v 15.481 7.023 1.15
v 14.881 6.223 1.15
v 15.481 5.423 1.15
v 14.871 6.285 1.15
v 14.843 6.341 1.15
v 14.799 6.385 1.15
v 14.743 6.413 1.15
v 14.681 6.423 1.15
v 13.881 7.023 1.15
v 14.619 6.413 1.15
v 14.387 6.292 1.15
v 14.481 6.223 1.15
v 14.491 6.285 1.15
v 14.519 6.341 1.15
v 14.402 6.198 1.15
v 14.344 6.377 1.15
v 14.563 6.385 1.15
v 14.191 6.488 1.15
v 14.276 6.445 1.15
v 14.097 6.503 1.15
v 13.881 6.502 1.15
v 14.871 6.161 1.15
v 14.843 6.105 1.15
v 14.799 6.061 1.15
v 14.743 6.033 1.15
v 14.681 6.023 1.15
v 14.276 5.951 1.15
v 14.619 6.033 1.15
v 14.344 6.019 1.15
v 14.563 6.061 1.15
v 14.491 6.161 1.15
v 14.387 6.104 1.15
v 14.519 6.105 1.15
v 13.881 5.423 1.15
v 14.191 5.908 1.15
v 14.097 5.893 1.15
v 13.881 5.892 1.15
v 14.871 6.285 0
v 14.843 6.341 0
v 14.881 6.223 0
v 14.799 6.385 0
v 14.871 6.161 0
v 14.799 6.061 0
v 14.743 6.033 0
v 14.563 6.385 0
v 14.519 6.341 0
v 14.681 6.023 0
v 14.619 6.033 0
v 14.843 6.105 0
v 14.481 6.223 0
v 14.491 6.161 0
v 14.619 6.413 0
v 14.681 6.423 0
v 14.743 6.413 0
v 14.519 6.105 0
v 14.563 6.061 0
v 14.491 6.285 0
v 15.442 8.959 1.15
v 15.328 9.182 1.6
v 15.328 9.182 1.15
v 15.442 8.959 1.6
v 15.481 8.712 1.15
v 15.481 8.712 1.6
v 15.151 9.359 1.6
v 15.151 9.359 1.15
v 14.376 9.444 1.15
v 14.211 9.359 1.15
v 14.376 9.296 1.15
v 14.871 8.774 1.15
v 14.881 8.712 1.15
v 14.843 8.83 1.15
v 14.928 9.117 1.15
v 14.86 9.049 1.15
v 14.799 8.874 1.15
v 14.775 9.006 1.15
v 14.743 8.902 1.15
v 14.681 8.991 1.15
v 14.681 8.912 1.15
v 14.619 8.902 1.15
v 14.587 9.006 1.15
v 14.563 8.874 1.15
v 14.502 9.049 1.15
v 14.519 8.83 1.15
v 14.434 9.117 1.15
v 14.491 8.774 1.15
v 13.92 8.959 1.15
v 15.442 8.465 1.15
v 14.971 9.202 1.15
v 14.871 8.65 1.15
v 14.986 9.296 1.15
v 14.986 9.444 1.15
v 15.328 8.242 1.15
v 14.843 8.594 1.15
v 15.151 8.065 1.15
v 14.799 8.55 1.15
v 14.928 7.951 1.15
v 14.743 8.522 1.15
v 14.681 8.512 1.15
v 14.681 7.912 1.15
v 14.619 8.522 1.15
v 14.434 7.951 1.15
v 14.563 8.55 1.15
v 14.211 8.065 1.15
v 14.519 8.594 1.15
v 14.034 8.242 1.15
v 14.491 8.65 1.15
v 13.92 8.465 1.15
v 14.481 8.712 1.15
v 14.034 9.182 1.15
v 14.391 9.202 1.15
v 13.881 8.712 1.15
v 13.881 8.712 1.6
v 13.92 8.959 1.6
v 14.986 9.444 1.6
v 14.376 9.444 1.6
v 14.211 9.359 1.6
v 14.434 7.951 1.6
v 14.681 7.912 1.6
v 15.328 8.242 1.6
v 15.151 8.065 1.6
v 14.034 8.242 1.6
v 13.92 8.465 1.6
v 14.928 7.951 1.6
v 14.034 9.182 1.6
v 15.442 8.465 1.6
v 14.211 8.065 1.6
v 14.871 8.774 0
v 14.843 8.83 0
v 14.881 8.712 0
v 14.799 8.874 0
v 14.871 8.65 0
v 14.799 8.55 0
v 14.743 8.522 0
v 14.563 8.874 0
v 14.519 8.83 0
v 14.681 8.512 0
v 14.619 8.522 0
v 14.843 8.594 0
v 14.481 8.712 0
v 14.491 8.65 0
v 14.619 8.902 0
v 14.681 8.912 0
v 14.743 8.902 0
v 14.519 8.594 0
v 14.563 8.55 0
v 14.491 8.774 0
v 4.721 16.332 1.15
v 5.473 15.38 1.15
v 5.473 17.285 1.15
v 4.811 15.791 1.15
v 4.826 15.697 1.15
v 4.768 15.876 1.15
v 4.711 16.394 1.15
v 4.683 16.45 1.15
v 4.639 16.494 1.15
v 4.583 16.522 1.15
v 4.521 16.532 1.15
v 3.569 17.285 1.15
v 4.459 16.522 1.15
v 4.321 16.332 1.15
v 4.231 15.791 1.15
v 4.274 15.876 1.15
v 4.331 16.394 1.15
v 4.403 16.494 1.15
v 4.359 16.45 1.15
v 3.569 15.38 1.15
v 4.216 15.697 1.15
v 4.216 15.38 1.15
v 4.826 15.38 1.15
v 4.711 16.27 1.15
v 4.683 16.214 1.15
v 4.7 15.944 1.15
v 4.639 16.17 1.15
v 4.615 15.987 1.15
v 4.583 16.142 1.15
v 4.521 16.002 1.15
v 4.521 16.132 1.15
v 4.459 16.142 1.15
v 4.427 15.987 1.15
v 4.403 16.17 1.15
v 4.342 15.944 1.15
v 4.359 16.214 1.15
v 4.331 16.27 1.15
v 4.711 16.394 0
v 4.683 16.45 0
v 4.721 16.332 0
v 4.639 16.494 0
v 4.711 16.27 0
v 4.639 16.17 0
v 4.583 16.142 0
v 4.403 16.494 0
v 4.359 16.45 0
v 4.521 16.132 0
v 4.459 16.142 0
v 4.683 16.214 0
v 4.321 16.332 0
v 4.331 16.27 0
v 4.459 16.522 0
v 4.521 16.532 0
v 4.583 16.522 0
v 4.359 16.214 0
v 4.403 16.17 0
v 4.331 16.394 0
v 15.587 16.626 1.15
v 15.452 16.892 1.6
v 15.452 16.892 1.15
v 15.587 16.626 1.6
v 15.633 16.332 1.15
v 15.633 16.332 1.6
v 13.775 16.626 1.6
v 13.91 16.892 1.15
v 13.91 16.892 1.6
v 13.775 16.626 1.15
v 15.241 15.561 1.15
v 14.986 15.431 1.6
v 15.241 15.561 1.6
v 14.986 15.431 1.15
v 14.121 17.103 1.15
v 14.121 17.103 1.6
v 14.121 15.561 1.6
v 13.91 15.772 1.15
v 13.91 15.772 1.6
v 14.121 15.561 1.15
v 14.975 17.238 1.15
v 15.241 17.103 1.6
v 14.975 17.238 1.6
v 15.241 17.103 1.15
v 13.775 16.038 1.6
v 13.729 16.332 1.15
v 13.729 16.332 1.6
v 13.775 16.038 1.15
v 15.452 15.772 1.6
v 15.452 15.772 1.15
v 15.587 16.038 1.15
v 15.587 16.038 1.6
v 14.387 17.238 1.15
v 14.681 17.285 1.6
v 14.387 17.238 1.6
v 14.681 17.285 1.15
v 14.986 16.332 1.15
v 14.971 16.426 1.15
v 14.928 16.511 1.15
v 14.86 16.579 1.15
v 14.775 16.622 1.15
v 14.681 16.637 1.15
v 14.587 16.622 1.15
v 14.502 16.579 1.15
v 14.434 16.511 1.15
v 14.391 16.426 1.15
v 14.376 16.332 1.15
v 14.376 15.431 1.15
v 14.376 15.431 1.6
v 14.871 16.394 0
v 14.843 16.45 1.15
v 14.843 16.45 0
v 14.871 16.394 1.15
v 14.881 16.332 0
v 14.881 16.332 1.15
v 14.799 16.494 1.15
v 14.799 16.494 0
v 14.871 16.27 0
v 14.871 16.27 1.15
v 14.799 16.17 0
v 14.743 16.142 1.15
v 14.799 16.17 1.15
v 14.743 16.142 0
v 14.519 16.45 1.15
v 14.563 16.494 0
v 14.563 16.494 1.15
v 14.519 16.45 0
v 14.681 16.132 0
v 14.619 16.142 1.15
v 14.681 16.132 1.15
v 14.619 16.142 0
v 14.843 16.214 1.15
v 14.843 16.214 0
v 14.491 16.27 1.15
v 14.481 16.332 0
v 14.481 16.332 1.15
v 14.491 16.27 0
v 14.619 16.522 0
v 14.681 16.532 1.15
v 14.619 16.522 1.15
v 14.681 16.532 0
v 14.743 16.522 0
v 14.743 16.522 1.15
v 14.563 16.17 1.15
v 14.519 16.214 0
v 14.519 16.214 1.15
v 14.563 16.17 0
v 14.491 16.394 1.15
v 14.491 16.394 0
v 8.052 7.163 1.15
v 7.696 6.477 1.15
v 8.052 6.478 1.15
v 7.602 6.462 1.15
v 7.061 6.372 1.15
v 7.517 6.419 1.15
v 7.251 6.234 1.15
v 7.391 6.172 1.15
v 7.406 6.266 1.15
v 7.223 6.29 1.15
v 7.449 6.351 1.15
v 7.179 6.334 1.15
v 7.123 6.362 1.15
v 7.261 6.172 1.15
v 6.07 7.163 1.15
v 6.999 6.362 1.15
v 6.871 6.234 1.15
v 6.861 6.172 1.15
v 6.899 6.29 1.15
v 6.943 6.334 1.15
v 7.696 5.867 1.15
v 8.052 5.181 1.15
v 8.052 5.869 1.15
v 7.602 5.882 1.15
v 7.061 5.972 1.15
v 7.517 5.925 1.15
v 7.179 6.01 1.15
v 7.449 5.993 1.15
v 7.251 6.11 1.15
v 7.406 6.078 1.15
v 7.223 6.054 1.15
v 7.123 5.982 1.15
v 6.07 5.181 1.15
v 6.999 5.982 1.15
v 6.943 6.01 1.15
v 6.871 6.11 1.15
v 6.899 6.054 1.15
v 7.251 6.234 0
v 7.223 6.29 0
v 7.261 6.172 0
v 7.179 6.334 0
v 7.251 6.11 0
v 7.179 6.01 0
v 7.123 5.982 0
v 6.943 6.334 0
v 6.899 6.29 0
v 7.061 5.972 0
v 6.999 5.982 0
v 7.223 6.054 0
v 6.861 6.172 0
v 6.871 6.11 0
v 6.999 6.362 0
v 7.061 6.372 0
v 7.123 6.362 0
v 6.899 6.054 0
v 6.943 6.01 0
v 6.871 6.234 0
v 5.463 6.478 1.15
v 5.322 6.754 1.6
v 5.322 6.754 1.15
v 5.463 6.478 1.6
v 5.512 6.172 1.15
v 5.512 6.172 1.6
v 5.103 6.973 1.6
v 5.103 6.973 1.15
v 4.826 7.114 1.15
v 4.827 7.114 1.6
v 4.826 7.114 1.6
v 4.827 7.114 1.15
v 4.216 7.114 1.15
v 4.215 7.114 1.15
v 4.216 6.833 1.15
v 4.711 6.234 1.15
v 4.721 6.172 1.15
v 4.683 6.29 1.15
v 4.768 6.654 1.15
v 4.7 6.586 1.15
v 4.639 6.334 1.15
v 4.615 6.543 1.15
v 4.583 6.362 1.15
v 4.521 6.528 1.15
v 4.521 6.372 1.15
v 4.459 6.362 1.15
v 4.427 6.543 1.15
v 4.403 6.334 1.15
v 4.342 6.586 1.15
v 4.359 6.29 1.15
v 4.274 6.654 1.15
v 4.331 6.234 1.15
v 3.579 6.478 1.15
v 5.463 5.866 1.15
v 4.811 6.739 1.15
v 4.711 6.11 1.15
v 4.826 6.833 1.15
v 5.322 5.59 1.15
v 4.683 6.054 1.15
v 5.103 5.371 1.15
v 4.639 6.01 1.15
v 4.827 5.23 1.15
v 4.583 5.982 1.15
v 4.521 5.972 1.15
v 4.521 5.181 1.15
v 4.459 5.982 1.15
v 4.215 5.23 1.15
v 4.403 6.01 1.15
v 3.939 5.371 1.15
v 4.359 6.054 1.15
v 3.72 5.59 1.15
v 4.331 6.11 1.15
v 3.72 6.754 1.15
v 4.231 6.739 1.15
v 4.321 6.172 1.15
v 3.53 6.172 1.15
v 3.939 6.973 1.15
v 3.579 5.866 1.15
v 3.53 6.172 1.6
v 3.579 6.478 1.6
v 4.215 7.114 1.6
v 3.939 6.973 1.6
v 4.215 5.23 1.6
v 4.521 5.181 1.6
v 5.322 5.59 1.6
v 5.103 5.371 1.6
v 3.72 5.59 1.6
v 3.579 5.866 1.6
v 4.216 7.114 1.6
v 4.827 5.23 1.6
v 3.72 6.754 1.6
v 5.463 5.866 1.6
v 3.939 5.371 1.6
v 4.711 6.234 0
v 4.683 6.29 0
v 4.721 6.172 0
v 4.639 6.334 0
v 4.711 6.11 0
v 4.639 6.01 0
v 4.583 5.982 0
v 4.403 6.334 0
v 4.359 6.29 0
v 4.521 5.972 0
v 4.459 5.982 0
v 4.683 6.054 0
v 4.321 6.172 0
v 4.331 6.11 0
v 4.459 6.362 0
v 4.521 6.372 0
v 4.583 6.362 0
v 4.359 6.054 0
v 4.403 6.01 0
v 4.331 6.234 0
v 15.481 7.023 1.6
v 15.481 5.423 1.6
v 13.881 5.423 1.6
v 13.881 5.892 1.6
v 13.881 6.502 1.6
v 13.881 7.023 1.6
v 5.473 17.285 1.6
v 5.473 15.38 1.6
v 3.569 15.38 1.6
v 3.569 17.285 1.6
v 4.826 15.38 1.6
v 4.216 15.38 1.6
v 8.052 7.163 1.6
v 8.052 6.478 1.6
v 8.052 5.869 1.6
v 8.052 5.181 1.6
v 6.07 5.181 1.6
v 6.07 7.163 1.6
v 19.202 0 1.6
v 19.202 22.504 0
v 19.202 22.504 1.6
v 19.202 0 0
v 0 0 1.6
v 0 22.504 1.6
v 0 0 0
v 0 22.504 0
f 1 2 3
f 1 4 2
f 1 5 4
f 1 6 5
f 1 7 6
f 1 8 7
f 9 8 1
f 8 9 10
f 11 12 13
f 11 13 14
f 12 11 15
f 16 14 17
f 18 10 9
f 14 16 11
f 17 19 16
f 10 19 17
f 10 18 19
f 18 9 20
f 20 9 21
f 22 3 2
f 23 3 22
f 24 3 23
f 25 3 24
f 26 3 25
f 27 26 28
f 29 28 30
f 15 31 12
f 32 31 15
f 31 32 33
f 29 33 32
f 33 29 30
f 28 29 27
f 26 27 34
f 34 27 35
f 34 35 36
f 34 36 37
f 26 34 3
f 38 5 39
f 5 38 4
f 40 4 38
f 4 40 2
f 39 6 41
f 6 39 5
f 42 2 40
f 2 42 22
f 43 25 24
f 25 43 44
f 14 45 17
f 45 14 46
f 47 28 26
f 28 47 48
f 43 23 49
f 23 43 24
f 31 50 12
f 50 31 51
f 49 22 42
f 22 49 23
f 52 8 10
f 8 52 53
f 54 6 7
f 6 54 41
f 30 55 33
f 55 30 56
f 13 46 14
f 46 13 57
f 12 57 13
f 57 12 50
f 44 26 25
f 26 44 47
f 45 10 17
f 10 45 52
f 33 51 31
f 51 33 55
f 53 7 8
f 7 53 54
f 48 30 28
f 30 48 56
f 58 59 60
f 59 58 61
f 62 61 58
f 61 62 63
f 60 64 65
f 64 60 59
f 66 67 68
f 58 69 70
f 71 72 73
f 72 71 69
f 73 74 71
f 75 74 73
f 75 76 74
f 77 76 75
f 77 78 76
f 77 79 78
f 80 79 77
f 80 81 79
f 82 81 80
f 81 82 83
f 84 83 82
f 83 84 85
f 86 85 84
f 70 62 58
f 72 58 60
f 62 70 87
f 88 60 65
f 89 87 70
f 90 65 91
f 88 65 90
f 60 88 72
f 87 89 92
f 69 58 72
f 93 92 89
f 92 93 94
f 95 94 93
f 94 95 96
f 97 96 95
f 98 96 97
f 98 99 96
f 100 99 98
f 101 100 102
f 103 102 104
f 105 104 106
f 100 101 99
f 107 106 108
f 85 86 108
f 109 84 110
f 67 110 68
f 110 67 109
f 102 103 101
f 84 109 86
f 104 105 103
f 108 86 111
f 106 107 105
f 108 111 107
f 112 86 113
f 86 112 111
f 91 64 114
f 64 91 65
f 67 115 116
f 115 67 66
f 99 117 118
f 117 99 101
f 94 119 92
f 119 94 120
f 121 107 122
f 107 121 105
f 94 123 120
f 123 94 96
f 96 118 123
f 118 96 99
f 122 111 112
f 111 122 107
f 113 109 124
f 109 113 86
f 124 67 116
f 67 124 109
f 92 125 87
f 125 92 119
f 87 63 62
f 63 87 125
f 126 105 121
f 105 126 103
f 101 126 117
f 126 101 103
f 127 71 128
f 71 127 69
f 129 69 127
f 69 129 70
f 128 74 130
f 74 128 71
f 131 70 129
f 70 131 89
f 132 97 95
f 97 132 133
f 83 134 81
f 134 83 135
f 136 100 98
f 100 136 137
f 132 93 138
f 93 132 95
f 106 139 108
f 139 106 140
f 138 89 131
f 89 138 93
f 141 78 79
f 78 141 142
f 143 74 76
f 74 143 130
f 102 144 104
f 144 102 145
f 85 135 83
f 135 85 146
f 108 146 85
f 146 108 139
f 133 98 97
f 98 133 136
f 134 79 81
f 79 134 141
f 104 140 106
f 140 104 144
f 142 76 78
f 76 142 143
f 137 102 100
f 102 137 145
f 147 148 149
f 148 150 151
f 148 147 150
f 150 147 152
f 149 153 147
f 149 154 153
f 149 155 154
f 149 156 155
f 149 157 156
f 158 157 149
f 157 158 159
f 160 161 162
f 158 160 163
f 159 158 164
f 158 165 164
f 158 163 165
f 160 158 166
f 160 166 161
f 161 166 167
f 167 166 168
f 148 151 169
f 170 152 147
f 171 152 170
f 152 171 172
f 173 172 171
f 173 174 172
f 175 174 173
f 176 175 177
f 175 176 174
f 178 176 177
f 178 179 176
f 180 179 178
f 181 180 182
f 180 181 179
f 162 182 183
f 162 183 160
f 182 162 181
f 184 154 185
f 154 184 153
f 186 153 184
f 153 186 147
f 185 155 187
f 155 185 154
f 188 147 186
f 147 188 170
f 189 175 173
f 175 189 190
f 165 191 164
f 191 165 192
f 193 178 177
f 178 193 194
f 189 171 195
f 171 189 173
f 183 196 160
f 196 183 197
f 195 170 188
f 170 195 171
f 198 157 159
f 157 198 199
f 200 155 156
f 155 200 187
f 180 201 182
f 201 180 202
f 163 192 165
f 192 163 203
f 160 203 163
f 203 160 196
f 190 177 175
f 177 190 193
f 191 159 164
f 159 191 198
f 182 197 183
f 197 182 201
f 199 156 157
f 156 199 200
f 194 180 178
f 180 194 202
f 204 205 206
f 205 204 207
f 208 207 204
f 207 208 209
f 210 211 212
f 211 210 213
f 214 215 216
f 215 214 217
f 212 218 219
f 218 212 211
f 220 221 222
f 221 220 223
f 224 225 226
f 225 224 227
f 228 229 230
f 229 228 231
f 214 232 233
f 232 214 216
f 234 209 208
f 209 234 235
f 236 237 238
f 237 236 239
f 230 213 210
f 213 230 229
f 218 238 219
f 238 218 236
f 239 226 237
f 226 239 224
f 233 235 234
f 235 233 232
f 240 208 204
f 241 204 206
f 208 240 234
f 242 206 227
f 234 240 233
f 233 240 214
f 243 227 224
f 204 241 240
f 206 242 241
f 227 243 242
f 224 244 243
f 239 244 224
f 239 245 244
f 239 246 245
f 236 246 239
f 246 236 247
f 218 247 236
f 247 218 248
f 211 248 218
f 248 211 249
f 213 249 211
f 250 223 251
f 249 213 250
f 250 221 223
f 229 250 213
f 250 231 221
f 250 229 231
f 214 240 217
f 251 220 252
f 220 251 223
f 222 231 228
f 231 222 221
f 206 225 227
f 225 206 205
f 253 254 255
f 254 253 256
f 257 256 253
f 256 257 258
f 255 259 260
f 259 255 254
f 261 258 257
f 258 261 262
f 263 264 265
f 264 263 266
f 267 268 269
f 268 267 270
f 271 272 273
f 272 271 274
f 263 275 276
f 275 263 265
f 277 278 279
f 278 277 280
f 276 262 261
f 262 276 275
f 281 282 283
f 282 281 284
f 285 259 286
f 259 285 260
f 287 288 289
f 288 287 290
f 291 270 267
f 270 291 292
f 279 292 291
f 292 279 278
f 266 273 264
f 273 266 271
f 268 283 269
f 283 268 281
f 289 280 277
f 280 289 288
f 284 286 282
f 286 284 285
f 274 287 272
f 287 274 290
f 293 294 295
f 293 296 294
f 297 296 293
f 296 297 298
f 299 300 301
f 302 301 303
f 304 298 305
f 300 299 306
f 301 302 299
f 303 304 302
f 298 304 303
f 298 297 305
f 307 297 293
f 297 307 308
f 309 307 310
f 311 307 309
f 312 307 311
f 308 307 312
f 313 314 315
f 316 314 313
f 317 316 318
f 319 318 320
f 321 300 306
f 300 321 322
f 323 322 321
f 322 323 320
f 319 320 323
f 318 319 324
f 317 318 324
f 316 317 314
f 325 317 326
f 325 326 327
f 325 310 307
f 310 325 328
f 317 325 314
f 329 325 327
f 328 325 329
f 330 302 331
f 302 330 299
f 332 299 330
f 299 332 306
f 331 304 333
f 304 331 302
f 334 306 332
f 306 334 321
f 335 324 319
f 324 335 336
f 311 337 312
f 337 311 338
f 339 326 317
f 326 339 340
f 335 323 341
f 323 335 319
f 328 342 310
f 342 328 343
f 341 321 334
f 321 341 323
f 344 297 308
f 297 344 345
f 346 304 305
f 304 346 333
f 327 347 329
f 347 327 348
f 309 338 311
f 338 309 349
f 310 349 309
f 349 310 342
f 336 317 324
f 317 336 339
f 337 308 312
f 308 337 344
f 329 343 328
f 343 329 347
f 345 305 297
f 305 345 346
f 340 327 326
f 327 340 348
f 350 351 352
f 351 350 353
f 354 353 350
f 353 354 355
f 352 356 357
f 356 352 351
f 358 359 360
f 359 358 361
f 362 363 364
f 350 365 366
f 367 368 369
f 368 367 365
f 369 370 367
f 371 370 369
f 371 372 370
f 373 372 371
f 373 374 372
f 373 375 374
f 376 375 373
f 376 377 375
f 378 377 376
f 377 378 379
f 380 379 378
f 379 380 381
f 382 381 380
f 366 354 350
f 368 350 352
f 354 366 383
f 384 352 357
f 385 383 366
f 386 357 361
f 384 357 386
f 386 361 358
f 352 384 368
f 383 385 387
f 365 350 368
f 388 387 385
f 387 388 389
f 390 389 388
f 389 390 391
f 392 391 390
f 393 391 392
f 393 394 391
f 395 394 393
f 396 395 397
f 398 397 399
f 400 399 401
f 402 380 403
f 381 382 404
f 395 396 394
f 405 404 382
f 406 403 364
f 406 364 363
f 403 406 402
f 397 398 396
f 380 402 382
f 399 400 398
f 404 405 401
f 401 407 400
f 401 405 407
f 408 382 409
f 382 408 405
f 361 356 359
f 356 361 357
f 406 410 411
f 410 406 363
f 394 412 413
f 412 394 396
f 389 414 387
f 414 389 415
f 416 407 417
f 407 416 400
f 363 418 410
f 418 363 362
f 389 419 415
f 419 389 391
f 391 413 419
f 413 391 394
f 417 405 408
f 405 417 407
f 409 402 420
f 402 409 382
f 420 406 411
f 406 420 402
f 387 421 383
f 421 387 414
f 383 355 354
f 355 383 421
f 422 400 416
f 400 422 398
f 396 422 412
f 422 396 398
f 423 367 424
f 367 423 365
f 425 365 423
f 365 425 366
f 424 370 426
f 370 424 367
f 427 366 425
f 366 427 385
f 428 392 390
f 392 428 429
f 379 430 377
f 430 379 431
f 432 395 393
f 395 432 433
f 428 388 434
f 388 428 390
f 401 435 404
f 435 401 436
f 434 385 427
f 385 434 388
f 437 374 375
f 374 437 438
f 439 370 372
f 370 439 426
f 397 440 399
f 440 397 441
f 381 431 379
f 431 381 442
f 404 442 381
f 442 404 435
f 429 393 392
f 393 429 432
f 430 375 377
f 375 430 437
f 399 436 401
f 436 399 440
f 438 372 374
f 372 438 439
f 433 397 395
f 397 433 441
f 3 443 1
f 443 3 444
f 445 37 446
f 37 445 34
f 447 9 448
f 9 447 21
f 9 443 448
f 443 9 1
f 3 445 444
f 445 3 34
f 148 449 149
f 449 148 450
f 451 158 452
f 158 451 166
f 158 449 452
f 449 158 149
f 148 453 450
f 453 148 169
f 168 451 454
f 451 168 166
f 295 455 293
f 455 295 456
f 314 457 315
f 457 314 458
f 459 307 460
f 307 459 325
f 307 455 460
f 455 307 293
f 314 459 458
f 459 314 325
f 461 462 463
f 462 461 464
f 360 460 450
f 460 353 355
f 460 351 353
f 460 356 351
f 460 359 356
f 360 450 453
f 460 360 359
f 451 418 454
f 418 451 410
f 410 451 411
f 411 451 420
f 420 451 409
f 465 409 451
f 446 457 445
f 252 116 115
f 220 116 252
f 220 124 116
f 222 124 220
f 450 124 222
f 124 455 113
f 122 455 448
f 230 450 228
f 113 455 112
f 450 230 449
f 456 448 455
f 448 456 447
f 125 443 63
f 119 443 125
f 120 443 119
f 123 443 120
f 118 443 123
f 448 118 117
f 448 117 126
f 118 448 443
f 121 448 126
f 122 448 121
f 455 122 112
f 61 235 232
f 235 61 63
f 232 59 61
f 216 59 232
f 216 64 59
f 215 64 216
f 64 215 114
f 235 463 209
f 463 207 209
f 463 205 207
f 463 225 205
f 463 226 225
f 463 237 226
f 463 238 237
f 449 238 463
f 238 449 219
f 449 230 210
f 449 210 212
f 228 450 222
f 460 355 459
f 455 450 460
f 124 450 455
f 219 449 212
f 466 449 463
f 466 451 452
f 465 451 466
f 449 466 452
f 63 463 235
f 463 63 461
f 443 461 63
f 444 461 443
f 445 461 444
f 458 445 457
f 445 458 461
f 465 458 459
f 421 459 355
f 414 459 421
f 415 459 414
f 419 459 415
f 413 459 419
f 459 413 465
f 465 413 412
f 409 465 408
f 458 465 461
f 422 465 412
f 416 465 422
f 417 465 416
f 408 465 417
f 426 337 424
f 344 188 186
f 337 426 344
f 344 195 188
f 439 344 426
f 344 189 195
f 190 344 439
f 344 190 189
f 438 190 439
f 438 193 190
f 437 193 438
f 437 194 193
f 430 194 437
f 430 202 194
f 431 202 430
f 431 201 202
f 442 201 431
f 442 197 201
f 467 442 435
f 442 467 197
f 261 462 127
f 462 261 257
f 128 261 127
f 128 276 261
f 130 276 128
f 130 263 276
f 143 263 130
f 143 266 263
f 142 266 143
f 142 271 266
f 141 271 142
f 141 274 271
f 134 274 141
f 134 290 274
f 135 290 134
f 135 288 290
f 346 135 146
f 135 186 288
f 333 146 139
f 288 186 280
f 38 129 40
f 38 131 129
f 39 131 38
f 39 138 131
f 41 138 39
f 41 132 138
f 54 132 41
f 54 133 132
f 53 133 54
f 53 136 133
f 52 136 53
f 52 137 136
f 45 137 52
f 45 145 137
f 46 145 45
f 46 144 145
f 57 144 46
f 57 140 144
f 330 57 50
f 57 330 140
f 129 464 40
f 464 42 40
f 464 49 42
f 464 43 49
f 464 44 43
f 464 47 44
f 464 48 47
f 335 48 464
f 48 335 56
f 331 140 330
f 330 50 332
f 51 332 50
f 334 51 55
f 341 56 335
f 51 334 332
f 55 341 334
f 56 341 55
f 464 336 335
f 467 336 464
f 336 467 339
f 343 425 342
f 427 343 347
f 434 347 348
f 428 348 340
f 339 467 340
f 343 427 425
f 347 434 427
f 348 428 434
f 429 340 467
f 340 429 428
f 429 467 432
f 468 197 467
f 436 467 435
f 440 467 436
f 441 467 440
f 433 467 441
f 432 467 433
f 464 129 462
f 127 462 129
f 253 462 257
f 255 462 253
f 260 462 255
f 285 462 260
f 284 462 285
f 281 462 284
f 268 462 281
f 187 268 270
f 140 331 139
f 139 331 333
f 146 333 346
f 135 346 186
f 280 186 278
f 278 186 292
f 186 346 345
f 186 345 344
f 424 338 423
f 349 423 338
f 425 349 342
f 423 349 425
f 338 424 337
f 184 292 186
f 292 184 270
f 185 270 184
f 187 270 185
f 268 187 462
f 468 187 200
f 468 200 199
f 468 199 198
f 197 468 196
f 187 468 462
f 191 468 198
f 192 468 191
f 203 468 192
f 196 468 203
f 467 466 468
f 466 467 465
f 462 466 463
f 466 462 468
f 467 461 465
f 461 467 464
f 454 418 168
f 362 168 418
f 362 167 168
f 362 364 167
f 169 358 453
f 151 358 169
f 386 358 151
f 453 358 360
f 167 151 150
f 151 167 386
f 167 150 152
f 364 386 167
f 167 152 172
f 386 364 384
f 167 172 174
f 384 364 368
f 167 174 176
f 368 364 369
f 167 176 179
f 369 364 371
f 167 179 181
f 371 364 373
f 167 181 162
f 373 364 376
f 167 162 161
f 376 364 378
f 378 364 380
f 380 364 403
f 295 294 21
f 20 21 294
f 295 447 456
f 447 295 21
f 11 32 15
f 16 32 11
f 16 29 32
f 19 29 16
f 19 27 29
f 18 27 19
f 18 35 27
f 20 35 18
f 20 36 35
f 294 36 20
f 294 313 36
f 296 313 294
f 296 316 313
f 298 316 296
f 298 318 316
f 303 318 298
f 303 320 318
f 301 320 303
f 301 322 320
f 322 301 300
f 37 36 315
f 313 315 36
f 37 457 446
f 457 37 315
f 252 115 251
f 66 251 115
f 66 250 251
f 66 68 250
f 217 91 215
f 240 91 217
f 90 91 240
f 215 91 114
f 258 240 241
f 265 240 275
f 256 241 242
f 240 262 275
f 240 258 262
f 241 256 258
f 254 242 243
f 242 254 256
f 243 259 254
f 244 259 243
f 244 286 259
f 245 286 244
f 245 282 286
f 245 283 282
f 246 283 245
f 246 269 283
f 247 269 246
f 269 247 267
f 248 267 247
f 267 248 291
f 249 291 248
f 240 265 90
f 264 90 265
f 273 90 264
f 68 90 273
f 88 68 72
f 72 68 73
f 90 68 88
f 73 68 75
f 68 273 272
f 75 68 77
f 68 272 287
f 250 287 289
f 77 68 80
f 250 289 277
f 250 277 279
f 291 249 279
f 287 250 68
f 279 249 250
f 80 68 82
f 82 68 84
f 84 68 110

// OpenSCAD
//    Aperture primitives are part of GenPaintSCAD.rb
//    Copyright (C) 2013 Dru Jensen
//
//    GenPaintSCAD is free software: you can redistribute it and/or modify
//    it under the terms of the GNU General Public License as published by
//    the Free Software Foundation, either version 3 of the License, or
//    (at your option) any later version.
//
//    GenPaintSCAD is distributed in the hope that it will be useful,
//    but WITHOUT ANY WARRANTY; without even the implied warranty of
//    MERCHANTABILITY or FITNESS FOR A PARTICULAR PURPOSE.  See the
//    GNU General Public License for more details.
//
//    You should have received a copy of the GNU General Public License
//    along with this program.  If not, see <http://www.gnu.org/licenses/>.
$fn=20;

board_thickness = 1.6;    //Change this line yourself to alter board thickness
stencil_thickness = 0.4;  //Change this line yourself to alter gap thickness
hole_size = 0.4;          //Change this line yourself to alter size of the hole

//////////////////////////////////////////////////////////////////////////////////////////////////
// Start of aperture primitives: circle, rectangle, obround, polygon                    
// These accept the same parameters in the same order as Gerber aperture definitions    
// 'drill' holes in pads will be rendered if specified even though they are unprintable 
//////////////////////////////////////////////////////////////////////////////////////////////////

// Circle aperture type
module gerb_circle (diameter, hole_X=0, hole_Y=0) {
  if (hole_X == 0) {
    cylinder (r = diameter/2, h=stencil_thickness + .1, center = true);
  }
  else if (hole_Y == 0) {
    union(){
      cylinder (r = diameter/2, h=stencil_thickness + .1, center = true);
      translate([0,0,-board_thickness/2]) cylinder (r = hole_X/2, h=board_thickness + .1, center = true);
    }
  }
  else {
    union(){  
      cylinder (r = diameter/2, h=stencil_thickness + .1, center = true);
      translate([0,0,-board_thickness/2]) cube (size = [hole_X, hole_Y, board_thickness + .1], center = true);
    } 
  } 
}

// Rectangle aperture type
module gerb_rectangle (diam_X, diam_Y, hole_X=0, hole_Y=0) {
  if (hole_X==0) {
    cube (size = [diam_X, diam_Y, stencil_thickness + .1], center = true);
  }
  else if (hole_Y == 0) {
    union(){
      cube (size = [diam_X, diam_Y, stencil_thickness + .1], center = true);
      translate([0,0,-board_thickness/2]) cylinder (r = hole_X/2, h=board_thickness + .1, center = true);  
    }
  }
  else  {
    union(){
      cube (size = [diam_X, diam_Y, stencil_thickness + .1], center = true);
      translate([0,0,-board_thickness/2]) cube (size = [hole_X, hole_Y, board_thickness + .1], center = true);
    }
  }
}

// Obround aperture type
module gerb_obround_primitive (diam_X, diam_Y) {
  if (diam_X < diam_Y) {
    union(){
      cube(size = [diam_X, diam_Y-diam_X, stencil_thickness + .1], center = true);
      translate(v = [0, (diam_Y - diam_X) / 2, 0]) cylinder (r = diam_X/2, h=stencil_thickness, center = true);
      translate(v = [0, -((diam_Y - diam_X) / 2), 0]) cylinder (r = diam_X/2, h=stencil_thickness, center = true);
    }
    
  }
  else {  // diam_X is larger
    union(){
      cube(size = [diam_X-diam_Y, diam_Y, stencil_thickness + .1], center = true);
      translate(v = [(diam_X - diam_Y) / 2, 0, 0]) cylinder (r = diam_Y/2, h=stencil_thickness, center = true);
      translate(v = [-((diam_X - diam_Y) / 2), 0, 0]) cylinder (r = diam_Y/2, h=stencil_thickness, center = true);
    }
  }
}

module gerb_obround (diam_X, diam_Y, hole_X=0, hole_Y=0) {
  if (hole_X==0) {
    gerb_obround_primitive(diam_X, diam_Y);
  }
  else if (hole_Y == 0) {
    union(){
      gerb_obround_primitive(diam_X, diam_Y);
      translate([0,0,-board_thickness/2]) cylinder (r = hole_X/2, h=board_thickness + .1, center = true);  
    }
  }
  else  {
    union(){
      gerb_obround_primitive(diam_X, diam_Y);
      translate([0,0,-board_thickness/2]) cube (size = [hole_X, hole_Y, board_thickness + .1], center = true);
    }
  }
}

// Polygon aperture type
module gerb_polygon (diameter, num_sides, rotation=0, hole_X=0, hole_Y=0) {
  if (hole_X == 0) {
    rotate (a=[0,0,rotation]) cylinder (r = diameter/2, h=stencil_thickness + .1, $fn = num_sides, center = true);
  }
  else if (hole_Y == 0) {
    union(){
      rotate (a=[0,0,rotation]) cylinder (r = diameter/2, h=stencil_thickness + .1, $fn = num_sides, center = true);
      translate([0,0,-board_thickness/2]) cylinder (r = hole_X/2, h=board_thickness + .1, center = true);
    }
  }
  else {
    union(){  
      rotate (a=[0,0,rotation]) cylinder (r = diameter/2, h=stencil_thickness + .1, $fn = num_sides, center = true);
      translate([0,0,-board_thickness/2]) cube (size = [hole_X, hole_Y, board_thickness + .1], center = true);
    } 
  } 
}


//////////////////////////////////////////////////////////////////////////////////////////////////
// End of aperture primitives -- everything below is generated from the input gerber    
//////////////////////////////////////////////////////////////////////////////////////////////////

// Start of aperture definitions

module D10_w_hole() {
    gerb_circle(1.5999968, hole_size);
}
module D10() {
    gerb_circle(1.5999968);
}
module D11_w_hole() {
    gerb_circle(1.9049999999999998, hole_size);
}
module D11() {
    gerb_circle(1.9049999999999998);
}
module D12_w_hole() {
    gerb_circle(1.9811999999999999, hole_size);
}
module D12() {
    gerb_circle(1.9811999999999999);
}
module D13_w_hole() {
    gerb_rectangle(1.5999968, 1.5999968, hole_size);
}
module D13() {
    gerb_rectangle(1.5999968, 1.5999968);
}
module D14_w_hole() {
    gerb_rectangle(1.9049999999999998, 1.9049999999999998, hole_size);
}
module D14() {
    gerb_rectangle(1.9049999999999998, 1.9049999999999998);
}
module D15_w_hole() {
    gerb_rectangle(1.9811999999999999, 1.9811999999999999, hole_size);
}
module D15() {
    gerb_rectangle(1.9811999999999999, 1.9811999999999999);
}
module D16_w_hole() {
    gerb_circle(0.6096, hole_size);
}
module D16() {
    gerb_circle(0.6096);
}

// Scale the board 
scale(v=[1.0,1.0,1.0]) difference(){

    // First draw the solid part
    translate(v=[9.601199999999999, 11.252199999999998,board_thickness/2]) cube (size = [19.202399999999997, 22.504399999999997, board_thickness], center = true);

    // Next subtract each aperture flash from it
    translate (v=[14.681, 6.223, board_thickness - (stencil_thickness/2)]) D10_w_hole();
    translate (v=[14.681, 8.712, board_thickness - (stencil_thickness/2)]) D10_w_hole();
    translate (v=[4.521, 16.332, board_thickness - (stencil_thickness/2)]) D11_w_hole();
    translate (v=[14.681, 16.332, board_thickness - (stencil_thickness/2)]) D11_w_hole();
    translate (v=[7.061, 6.172, board_thickness - (stencil_thickness/2)]) D12_w_hole();
    translate (v=[4.521, 6.172, board_thickness - (stencil_thickness/2)]) D12_w_hole();
    translate (v=[14.681, 6.223, board_thickness - (stencil_thickness/2)]) D13_w_hole();
    translate (v=[4.521, 16.332, board_thickness - (stencil_thickness/2)]) D14_w_hole();
    translate (v=[7.061, 6.172, board_thickness - (stencil_thickness/2)]) D15_w_hole();

    // Last subtract the stencils from it
      hull() {
        translate (v=[4.521, 6.833, board_thickness - (stencil_thickness/2)]) D16();
        translate (v=[4.521, 15.697, board_thickness - (stencil_thickness/2)]) D16();
      }
      hull() {
        translate (v=[14.097, 6.198, board_thickness - (stencil_thickness/2)]) D16();
        translate (v=[7.696, 6.172, board_thickness - (stencil_thickness/2)]) D16();
      }
      hull() {
        translate (v=[14.681, 9.296, board_thickness - (stencil_thickness/2)]) D16();
        translate (v=[14.681, 16.332, board_thickness - (stencil_thickness/2)]) D16();
      }
}
